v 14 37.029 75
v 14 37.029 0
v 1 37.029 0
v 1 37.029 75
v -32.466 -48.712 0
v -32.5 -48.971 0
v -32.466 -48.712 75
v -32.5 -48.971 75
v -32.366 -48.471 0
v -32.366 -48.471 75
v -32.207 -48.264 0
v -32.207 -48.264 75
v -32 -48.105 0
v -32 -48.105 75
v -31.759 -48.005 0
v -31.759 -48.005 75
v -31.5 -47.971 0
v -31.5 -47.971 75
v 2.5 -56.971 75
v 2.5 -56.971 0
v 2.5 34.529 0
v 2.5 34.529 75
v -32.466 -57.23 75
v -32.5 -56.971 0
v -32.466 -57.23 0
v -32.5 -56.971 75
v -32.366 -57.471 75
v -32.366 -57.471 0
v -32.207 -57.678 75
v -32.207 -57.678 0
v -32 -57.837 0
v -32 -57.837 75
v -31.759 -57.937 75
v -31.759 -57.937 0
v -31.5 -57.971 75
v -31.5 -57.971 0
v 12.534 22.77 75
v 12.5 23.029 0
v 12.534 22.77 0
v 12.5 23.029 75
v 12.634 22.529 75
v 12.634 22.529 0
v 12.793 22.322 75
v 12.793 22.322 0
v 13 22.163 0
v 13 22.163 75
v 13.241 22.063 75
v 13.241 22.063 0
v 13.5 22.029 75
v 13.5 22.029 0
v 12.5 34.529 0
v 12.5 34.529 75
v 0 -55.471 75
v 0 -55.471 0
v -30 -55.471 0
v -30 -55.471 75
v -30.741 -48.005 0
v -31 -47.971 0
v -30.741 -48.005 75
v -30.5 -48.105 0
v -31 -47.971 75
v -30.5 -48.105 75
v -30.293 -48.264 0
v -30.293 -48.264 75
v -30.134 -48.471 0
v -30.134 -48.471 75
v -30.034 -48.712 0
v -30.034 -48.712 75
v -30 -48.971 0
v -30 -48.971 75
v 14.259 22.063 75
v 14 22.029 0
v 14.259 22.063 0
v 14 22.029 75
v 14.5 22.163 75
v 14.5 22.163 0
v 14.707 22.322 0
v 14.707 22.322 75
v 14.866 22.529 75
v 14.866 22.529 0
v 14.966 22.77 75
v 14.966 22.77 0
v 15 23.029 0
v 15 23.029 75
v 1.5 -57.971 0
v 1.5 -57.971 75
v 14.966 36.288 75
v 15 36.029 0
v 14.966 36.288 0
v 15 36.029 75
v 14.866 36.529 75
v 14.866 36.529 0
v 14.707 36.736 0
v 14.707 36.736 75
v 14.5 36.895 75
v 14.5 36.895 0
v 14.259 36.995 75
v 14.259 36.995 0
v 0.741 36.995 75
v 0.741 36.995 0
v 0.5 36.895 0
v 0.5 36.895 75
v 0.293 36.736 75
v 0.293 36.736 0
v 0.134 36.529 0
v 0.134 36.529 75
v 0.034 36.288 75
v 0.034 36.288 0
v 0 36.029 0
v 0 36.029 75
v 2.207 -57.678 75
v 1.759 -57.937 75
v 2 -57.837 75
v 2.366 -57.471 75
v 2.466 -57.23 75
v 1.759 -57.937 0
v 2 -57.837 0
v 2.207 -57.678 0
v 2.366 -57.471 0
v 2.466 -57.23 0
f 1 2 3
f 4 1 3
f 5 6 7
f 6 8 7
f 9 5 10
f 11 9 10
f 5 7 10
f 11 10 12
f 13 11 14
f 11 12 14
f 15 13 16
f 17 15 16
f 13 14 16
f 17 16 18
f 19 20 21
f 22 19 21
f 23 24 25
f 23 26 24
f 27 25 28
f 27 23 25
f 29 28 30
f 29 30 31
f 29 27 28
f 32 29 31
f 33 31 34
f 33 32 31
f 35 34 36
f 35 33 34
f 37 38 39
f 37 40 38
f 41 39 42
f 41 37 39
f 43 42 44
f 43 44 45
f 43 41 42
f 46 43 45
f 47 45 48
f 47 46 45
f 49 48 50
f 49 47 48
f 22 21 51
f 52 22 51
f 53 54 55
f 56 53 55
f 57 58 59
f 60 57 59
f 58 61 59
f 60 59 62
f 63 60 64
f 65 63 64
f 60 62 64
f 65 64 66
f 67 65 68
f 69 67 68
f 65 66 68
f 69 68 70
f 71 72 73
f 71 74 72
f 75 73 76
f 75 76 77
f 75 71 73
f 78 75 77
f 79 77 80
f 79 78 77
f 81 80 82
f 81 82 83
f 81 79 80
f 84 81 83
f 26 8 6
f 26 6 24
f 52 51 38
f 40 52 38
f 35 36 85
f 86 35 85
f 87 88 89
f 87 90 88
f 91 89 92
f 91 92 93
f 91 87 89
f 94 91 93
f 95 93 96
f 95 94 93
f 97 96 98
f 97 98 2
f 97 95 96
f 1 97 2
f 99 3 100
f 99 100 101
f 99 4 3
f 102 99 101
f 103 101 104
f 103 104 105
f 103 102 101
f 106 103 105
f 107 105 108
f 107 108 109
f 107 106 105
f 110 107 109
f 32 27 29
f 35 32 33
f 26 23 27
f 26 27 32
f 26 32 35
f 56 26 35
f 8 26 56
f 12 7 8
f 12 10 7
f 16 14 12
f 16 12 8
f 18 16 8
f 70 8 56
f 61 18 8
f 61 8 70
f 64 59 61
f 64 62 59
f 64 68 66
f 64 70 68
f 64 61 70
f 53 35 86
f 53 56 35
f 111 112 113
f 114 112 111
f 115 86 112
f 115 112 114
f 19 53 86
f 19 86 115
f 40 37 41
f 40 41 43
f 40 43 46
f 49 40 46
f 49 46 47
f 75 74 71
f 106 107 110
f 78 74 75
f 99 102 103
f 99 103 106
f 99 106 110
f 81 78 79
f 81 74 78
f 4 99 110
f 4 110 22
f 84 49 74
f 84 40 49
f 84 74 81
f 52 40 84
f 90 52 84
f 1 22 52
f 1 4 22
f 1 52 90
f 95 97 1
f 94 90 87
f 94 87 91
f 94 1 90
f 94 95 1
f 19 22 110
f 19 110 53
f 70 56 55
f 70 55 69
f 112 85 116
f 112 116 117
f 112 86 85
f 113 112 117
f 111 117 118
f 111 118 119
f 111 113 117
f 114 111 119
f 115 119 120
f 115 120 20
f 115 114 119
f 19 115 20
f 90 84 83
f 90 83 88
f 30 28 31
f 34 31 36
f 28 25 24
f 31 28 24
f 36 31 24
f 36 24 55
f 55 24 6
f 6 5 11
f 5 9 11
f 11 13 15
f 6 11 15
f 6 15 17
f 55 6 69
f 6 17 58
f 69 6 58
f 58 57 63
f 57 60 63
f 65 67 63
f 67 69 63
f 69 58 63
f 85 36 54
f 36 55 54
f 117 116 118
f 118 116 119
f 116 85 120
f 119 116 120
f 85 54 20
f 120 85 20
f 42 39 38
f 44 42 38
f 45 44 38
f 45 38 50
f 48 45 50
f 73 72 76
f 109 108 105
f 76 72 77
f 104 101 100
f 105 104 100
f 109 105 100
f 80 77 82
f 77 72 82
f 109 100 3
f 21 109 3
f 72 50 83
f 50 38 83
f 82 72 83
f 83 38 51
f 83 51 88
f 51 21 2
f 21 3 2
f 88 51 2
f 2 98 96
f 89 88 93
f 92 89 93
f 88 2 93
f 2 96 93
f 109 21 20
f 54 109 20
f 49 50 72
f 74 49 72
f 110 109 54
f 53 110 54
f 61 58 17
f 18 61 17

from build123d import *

# Parameters (mm, degrees)
F0_W     = 2.5
F0_H     = 6.25
F1_DEPTH = 75
F2_R     = 1
F3_R     = 1


with BuildPart() as f1:
    # F0 (on Top) → F1 (new body)
    with BuildSketch(Plane.XY):
        Polygon((2.5, 0), (0, 0), (0, -55.470833), (-15, -55.470833), (-15, -57.970833), (2.5, -57.970833), align=None)
        Polygon((7.5, 34.529167), (7.5, 37.029167), (0, 37.029167), (0, 0), (2.5, 0), (2.5, 34.529167), align=None)
        Polygon((12.5, 28.279167), (15, 28.279167), (15, 37.029167), (7.5, 37.029167), (7.5, 34.529167), (12.5, 34.529167), align=None)
        with Locations((13.75, 25.154167)):
            Rectangle(F0_W, F0_H)
        Polygon((-15, -57.970833), (-15, -55.470833), (-30, -55.470833), (-30, -47.970833), (-32.5, -47.970833), (-32.5, -57.970833), align=None)
    extrude(amount=F1_DEPTH)

    # F2
    f2_edges = [f1.edges().sort_by_distance(p)[0] for p in [
        (-32.5, -57.970833, 37.5),
        (2.5, -57.970833, 37.5),
        (15, 37.029167, 37.5),
        (0, 37.029167, 37.5),
    ]]
    fillet(f2_edges, radius=F2_R)

    # F3
    f3_edges = [f1.edges().sort_by_distance(p)[0] for p in [
        (-30, -47.970833, 37.5),
        (-32.5, -47.970833, 37.5),
        (15, 22.029167, 37.5),
        (12.5, 22.029167, 37.5),
    ]]
    fillet(f3_edges, radius=F3_R)


solid = f1.part
